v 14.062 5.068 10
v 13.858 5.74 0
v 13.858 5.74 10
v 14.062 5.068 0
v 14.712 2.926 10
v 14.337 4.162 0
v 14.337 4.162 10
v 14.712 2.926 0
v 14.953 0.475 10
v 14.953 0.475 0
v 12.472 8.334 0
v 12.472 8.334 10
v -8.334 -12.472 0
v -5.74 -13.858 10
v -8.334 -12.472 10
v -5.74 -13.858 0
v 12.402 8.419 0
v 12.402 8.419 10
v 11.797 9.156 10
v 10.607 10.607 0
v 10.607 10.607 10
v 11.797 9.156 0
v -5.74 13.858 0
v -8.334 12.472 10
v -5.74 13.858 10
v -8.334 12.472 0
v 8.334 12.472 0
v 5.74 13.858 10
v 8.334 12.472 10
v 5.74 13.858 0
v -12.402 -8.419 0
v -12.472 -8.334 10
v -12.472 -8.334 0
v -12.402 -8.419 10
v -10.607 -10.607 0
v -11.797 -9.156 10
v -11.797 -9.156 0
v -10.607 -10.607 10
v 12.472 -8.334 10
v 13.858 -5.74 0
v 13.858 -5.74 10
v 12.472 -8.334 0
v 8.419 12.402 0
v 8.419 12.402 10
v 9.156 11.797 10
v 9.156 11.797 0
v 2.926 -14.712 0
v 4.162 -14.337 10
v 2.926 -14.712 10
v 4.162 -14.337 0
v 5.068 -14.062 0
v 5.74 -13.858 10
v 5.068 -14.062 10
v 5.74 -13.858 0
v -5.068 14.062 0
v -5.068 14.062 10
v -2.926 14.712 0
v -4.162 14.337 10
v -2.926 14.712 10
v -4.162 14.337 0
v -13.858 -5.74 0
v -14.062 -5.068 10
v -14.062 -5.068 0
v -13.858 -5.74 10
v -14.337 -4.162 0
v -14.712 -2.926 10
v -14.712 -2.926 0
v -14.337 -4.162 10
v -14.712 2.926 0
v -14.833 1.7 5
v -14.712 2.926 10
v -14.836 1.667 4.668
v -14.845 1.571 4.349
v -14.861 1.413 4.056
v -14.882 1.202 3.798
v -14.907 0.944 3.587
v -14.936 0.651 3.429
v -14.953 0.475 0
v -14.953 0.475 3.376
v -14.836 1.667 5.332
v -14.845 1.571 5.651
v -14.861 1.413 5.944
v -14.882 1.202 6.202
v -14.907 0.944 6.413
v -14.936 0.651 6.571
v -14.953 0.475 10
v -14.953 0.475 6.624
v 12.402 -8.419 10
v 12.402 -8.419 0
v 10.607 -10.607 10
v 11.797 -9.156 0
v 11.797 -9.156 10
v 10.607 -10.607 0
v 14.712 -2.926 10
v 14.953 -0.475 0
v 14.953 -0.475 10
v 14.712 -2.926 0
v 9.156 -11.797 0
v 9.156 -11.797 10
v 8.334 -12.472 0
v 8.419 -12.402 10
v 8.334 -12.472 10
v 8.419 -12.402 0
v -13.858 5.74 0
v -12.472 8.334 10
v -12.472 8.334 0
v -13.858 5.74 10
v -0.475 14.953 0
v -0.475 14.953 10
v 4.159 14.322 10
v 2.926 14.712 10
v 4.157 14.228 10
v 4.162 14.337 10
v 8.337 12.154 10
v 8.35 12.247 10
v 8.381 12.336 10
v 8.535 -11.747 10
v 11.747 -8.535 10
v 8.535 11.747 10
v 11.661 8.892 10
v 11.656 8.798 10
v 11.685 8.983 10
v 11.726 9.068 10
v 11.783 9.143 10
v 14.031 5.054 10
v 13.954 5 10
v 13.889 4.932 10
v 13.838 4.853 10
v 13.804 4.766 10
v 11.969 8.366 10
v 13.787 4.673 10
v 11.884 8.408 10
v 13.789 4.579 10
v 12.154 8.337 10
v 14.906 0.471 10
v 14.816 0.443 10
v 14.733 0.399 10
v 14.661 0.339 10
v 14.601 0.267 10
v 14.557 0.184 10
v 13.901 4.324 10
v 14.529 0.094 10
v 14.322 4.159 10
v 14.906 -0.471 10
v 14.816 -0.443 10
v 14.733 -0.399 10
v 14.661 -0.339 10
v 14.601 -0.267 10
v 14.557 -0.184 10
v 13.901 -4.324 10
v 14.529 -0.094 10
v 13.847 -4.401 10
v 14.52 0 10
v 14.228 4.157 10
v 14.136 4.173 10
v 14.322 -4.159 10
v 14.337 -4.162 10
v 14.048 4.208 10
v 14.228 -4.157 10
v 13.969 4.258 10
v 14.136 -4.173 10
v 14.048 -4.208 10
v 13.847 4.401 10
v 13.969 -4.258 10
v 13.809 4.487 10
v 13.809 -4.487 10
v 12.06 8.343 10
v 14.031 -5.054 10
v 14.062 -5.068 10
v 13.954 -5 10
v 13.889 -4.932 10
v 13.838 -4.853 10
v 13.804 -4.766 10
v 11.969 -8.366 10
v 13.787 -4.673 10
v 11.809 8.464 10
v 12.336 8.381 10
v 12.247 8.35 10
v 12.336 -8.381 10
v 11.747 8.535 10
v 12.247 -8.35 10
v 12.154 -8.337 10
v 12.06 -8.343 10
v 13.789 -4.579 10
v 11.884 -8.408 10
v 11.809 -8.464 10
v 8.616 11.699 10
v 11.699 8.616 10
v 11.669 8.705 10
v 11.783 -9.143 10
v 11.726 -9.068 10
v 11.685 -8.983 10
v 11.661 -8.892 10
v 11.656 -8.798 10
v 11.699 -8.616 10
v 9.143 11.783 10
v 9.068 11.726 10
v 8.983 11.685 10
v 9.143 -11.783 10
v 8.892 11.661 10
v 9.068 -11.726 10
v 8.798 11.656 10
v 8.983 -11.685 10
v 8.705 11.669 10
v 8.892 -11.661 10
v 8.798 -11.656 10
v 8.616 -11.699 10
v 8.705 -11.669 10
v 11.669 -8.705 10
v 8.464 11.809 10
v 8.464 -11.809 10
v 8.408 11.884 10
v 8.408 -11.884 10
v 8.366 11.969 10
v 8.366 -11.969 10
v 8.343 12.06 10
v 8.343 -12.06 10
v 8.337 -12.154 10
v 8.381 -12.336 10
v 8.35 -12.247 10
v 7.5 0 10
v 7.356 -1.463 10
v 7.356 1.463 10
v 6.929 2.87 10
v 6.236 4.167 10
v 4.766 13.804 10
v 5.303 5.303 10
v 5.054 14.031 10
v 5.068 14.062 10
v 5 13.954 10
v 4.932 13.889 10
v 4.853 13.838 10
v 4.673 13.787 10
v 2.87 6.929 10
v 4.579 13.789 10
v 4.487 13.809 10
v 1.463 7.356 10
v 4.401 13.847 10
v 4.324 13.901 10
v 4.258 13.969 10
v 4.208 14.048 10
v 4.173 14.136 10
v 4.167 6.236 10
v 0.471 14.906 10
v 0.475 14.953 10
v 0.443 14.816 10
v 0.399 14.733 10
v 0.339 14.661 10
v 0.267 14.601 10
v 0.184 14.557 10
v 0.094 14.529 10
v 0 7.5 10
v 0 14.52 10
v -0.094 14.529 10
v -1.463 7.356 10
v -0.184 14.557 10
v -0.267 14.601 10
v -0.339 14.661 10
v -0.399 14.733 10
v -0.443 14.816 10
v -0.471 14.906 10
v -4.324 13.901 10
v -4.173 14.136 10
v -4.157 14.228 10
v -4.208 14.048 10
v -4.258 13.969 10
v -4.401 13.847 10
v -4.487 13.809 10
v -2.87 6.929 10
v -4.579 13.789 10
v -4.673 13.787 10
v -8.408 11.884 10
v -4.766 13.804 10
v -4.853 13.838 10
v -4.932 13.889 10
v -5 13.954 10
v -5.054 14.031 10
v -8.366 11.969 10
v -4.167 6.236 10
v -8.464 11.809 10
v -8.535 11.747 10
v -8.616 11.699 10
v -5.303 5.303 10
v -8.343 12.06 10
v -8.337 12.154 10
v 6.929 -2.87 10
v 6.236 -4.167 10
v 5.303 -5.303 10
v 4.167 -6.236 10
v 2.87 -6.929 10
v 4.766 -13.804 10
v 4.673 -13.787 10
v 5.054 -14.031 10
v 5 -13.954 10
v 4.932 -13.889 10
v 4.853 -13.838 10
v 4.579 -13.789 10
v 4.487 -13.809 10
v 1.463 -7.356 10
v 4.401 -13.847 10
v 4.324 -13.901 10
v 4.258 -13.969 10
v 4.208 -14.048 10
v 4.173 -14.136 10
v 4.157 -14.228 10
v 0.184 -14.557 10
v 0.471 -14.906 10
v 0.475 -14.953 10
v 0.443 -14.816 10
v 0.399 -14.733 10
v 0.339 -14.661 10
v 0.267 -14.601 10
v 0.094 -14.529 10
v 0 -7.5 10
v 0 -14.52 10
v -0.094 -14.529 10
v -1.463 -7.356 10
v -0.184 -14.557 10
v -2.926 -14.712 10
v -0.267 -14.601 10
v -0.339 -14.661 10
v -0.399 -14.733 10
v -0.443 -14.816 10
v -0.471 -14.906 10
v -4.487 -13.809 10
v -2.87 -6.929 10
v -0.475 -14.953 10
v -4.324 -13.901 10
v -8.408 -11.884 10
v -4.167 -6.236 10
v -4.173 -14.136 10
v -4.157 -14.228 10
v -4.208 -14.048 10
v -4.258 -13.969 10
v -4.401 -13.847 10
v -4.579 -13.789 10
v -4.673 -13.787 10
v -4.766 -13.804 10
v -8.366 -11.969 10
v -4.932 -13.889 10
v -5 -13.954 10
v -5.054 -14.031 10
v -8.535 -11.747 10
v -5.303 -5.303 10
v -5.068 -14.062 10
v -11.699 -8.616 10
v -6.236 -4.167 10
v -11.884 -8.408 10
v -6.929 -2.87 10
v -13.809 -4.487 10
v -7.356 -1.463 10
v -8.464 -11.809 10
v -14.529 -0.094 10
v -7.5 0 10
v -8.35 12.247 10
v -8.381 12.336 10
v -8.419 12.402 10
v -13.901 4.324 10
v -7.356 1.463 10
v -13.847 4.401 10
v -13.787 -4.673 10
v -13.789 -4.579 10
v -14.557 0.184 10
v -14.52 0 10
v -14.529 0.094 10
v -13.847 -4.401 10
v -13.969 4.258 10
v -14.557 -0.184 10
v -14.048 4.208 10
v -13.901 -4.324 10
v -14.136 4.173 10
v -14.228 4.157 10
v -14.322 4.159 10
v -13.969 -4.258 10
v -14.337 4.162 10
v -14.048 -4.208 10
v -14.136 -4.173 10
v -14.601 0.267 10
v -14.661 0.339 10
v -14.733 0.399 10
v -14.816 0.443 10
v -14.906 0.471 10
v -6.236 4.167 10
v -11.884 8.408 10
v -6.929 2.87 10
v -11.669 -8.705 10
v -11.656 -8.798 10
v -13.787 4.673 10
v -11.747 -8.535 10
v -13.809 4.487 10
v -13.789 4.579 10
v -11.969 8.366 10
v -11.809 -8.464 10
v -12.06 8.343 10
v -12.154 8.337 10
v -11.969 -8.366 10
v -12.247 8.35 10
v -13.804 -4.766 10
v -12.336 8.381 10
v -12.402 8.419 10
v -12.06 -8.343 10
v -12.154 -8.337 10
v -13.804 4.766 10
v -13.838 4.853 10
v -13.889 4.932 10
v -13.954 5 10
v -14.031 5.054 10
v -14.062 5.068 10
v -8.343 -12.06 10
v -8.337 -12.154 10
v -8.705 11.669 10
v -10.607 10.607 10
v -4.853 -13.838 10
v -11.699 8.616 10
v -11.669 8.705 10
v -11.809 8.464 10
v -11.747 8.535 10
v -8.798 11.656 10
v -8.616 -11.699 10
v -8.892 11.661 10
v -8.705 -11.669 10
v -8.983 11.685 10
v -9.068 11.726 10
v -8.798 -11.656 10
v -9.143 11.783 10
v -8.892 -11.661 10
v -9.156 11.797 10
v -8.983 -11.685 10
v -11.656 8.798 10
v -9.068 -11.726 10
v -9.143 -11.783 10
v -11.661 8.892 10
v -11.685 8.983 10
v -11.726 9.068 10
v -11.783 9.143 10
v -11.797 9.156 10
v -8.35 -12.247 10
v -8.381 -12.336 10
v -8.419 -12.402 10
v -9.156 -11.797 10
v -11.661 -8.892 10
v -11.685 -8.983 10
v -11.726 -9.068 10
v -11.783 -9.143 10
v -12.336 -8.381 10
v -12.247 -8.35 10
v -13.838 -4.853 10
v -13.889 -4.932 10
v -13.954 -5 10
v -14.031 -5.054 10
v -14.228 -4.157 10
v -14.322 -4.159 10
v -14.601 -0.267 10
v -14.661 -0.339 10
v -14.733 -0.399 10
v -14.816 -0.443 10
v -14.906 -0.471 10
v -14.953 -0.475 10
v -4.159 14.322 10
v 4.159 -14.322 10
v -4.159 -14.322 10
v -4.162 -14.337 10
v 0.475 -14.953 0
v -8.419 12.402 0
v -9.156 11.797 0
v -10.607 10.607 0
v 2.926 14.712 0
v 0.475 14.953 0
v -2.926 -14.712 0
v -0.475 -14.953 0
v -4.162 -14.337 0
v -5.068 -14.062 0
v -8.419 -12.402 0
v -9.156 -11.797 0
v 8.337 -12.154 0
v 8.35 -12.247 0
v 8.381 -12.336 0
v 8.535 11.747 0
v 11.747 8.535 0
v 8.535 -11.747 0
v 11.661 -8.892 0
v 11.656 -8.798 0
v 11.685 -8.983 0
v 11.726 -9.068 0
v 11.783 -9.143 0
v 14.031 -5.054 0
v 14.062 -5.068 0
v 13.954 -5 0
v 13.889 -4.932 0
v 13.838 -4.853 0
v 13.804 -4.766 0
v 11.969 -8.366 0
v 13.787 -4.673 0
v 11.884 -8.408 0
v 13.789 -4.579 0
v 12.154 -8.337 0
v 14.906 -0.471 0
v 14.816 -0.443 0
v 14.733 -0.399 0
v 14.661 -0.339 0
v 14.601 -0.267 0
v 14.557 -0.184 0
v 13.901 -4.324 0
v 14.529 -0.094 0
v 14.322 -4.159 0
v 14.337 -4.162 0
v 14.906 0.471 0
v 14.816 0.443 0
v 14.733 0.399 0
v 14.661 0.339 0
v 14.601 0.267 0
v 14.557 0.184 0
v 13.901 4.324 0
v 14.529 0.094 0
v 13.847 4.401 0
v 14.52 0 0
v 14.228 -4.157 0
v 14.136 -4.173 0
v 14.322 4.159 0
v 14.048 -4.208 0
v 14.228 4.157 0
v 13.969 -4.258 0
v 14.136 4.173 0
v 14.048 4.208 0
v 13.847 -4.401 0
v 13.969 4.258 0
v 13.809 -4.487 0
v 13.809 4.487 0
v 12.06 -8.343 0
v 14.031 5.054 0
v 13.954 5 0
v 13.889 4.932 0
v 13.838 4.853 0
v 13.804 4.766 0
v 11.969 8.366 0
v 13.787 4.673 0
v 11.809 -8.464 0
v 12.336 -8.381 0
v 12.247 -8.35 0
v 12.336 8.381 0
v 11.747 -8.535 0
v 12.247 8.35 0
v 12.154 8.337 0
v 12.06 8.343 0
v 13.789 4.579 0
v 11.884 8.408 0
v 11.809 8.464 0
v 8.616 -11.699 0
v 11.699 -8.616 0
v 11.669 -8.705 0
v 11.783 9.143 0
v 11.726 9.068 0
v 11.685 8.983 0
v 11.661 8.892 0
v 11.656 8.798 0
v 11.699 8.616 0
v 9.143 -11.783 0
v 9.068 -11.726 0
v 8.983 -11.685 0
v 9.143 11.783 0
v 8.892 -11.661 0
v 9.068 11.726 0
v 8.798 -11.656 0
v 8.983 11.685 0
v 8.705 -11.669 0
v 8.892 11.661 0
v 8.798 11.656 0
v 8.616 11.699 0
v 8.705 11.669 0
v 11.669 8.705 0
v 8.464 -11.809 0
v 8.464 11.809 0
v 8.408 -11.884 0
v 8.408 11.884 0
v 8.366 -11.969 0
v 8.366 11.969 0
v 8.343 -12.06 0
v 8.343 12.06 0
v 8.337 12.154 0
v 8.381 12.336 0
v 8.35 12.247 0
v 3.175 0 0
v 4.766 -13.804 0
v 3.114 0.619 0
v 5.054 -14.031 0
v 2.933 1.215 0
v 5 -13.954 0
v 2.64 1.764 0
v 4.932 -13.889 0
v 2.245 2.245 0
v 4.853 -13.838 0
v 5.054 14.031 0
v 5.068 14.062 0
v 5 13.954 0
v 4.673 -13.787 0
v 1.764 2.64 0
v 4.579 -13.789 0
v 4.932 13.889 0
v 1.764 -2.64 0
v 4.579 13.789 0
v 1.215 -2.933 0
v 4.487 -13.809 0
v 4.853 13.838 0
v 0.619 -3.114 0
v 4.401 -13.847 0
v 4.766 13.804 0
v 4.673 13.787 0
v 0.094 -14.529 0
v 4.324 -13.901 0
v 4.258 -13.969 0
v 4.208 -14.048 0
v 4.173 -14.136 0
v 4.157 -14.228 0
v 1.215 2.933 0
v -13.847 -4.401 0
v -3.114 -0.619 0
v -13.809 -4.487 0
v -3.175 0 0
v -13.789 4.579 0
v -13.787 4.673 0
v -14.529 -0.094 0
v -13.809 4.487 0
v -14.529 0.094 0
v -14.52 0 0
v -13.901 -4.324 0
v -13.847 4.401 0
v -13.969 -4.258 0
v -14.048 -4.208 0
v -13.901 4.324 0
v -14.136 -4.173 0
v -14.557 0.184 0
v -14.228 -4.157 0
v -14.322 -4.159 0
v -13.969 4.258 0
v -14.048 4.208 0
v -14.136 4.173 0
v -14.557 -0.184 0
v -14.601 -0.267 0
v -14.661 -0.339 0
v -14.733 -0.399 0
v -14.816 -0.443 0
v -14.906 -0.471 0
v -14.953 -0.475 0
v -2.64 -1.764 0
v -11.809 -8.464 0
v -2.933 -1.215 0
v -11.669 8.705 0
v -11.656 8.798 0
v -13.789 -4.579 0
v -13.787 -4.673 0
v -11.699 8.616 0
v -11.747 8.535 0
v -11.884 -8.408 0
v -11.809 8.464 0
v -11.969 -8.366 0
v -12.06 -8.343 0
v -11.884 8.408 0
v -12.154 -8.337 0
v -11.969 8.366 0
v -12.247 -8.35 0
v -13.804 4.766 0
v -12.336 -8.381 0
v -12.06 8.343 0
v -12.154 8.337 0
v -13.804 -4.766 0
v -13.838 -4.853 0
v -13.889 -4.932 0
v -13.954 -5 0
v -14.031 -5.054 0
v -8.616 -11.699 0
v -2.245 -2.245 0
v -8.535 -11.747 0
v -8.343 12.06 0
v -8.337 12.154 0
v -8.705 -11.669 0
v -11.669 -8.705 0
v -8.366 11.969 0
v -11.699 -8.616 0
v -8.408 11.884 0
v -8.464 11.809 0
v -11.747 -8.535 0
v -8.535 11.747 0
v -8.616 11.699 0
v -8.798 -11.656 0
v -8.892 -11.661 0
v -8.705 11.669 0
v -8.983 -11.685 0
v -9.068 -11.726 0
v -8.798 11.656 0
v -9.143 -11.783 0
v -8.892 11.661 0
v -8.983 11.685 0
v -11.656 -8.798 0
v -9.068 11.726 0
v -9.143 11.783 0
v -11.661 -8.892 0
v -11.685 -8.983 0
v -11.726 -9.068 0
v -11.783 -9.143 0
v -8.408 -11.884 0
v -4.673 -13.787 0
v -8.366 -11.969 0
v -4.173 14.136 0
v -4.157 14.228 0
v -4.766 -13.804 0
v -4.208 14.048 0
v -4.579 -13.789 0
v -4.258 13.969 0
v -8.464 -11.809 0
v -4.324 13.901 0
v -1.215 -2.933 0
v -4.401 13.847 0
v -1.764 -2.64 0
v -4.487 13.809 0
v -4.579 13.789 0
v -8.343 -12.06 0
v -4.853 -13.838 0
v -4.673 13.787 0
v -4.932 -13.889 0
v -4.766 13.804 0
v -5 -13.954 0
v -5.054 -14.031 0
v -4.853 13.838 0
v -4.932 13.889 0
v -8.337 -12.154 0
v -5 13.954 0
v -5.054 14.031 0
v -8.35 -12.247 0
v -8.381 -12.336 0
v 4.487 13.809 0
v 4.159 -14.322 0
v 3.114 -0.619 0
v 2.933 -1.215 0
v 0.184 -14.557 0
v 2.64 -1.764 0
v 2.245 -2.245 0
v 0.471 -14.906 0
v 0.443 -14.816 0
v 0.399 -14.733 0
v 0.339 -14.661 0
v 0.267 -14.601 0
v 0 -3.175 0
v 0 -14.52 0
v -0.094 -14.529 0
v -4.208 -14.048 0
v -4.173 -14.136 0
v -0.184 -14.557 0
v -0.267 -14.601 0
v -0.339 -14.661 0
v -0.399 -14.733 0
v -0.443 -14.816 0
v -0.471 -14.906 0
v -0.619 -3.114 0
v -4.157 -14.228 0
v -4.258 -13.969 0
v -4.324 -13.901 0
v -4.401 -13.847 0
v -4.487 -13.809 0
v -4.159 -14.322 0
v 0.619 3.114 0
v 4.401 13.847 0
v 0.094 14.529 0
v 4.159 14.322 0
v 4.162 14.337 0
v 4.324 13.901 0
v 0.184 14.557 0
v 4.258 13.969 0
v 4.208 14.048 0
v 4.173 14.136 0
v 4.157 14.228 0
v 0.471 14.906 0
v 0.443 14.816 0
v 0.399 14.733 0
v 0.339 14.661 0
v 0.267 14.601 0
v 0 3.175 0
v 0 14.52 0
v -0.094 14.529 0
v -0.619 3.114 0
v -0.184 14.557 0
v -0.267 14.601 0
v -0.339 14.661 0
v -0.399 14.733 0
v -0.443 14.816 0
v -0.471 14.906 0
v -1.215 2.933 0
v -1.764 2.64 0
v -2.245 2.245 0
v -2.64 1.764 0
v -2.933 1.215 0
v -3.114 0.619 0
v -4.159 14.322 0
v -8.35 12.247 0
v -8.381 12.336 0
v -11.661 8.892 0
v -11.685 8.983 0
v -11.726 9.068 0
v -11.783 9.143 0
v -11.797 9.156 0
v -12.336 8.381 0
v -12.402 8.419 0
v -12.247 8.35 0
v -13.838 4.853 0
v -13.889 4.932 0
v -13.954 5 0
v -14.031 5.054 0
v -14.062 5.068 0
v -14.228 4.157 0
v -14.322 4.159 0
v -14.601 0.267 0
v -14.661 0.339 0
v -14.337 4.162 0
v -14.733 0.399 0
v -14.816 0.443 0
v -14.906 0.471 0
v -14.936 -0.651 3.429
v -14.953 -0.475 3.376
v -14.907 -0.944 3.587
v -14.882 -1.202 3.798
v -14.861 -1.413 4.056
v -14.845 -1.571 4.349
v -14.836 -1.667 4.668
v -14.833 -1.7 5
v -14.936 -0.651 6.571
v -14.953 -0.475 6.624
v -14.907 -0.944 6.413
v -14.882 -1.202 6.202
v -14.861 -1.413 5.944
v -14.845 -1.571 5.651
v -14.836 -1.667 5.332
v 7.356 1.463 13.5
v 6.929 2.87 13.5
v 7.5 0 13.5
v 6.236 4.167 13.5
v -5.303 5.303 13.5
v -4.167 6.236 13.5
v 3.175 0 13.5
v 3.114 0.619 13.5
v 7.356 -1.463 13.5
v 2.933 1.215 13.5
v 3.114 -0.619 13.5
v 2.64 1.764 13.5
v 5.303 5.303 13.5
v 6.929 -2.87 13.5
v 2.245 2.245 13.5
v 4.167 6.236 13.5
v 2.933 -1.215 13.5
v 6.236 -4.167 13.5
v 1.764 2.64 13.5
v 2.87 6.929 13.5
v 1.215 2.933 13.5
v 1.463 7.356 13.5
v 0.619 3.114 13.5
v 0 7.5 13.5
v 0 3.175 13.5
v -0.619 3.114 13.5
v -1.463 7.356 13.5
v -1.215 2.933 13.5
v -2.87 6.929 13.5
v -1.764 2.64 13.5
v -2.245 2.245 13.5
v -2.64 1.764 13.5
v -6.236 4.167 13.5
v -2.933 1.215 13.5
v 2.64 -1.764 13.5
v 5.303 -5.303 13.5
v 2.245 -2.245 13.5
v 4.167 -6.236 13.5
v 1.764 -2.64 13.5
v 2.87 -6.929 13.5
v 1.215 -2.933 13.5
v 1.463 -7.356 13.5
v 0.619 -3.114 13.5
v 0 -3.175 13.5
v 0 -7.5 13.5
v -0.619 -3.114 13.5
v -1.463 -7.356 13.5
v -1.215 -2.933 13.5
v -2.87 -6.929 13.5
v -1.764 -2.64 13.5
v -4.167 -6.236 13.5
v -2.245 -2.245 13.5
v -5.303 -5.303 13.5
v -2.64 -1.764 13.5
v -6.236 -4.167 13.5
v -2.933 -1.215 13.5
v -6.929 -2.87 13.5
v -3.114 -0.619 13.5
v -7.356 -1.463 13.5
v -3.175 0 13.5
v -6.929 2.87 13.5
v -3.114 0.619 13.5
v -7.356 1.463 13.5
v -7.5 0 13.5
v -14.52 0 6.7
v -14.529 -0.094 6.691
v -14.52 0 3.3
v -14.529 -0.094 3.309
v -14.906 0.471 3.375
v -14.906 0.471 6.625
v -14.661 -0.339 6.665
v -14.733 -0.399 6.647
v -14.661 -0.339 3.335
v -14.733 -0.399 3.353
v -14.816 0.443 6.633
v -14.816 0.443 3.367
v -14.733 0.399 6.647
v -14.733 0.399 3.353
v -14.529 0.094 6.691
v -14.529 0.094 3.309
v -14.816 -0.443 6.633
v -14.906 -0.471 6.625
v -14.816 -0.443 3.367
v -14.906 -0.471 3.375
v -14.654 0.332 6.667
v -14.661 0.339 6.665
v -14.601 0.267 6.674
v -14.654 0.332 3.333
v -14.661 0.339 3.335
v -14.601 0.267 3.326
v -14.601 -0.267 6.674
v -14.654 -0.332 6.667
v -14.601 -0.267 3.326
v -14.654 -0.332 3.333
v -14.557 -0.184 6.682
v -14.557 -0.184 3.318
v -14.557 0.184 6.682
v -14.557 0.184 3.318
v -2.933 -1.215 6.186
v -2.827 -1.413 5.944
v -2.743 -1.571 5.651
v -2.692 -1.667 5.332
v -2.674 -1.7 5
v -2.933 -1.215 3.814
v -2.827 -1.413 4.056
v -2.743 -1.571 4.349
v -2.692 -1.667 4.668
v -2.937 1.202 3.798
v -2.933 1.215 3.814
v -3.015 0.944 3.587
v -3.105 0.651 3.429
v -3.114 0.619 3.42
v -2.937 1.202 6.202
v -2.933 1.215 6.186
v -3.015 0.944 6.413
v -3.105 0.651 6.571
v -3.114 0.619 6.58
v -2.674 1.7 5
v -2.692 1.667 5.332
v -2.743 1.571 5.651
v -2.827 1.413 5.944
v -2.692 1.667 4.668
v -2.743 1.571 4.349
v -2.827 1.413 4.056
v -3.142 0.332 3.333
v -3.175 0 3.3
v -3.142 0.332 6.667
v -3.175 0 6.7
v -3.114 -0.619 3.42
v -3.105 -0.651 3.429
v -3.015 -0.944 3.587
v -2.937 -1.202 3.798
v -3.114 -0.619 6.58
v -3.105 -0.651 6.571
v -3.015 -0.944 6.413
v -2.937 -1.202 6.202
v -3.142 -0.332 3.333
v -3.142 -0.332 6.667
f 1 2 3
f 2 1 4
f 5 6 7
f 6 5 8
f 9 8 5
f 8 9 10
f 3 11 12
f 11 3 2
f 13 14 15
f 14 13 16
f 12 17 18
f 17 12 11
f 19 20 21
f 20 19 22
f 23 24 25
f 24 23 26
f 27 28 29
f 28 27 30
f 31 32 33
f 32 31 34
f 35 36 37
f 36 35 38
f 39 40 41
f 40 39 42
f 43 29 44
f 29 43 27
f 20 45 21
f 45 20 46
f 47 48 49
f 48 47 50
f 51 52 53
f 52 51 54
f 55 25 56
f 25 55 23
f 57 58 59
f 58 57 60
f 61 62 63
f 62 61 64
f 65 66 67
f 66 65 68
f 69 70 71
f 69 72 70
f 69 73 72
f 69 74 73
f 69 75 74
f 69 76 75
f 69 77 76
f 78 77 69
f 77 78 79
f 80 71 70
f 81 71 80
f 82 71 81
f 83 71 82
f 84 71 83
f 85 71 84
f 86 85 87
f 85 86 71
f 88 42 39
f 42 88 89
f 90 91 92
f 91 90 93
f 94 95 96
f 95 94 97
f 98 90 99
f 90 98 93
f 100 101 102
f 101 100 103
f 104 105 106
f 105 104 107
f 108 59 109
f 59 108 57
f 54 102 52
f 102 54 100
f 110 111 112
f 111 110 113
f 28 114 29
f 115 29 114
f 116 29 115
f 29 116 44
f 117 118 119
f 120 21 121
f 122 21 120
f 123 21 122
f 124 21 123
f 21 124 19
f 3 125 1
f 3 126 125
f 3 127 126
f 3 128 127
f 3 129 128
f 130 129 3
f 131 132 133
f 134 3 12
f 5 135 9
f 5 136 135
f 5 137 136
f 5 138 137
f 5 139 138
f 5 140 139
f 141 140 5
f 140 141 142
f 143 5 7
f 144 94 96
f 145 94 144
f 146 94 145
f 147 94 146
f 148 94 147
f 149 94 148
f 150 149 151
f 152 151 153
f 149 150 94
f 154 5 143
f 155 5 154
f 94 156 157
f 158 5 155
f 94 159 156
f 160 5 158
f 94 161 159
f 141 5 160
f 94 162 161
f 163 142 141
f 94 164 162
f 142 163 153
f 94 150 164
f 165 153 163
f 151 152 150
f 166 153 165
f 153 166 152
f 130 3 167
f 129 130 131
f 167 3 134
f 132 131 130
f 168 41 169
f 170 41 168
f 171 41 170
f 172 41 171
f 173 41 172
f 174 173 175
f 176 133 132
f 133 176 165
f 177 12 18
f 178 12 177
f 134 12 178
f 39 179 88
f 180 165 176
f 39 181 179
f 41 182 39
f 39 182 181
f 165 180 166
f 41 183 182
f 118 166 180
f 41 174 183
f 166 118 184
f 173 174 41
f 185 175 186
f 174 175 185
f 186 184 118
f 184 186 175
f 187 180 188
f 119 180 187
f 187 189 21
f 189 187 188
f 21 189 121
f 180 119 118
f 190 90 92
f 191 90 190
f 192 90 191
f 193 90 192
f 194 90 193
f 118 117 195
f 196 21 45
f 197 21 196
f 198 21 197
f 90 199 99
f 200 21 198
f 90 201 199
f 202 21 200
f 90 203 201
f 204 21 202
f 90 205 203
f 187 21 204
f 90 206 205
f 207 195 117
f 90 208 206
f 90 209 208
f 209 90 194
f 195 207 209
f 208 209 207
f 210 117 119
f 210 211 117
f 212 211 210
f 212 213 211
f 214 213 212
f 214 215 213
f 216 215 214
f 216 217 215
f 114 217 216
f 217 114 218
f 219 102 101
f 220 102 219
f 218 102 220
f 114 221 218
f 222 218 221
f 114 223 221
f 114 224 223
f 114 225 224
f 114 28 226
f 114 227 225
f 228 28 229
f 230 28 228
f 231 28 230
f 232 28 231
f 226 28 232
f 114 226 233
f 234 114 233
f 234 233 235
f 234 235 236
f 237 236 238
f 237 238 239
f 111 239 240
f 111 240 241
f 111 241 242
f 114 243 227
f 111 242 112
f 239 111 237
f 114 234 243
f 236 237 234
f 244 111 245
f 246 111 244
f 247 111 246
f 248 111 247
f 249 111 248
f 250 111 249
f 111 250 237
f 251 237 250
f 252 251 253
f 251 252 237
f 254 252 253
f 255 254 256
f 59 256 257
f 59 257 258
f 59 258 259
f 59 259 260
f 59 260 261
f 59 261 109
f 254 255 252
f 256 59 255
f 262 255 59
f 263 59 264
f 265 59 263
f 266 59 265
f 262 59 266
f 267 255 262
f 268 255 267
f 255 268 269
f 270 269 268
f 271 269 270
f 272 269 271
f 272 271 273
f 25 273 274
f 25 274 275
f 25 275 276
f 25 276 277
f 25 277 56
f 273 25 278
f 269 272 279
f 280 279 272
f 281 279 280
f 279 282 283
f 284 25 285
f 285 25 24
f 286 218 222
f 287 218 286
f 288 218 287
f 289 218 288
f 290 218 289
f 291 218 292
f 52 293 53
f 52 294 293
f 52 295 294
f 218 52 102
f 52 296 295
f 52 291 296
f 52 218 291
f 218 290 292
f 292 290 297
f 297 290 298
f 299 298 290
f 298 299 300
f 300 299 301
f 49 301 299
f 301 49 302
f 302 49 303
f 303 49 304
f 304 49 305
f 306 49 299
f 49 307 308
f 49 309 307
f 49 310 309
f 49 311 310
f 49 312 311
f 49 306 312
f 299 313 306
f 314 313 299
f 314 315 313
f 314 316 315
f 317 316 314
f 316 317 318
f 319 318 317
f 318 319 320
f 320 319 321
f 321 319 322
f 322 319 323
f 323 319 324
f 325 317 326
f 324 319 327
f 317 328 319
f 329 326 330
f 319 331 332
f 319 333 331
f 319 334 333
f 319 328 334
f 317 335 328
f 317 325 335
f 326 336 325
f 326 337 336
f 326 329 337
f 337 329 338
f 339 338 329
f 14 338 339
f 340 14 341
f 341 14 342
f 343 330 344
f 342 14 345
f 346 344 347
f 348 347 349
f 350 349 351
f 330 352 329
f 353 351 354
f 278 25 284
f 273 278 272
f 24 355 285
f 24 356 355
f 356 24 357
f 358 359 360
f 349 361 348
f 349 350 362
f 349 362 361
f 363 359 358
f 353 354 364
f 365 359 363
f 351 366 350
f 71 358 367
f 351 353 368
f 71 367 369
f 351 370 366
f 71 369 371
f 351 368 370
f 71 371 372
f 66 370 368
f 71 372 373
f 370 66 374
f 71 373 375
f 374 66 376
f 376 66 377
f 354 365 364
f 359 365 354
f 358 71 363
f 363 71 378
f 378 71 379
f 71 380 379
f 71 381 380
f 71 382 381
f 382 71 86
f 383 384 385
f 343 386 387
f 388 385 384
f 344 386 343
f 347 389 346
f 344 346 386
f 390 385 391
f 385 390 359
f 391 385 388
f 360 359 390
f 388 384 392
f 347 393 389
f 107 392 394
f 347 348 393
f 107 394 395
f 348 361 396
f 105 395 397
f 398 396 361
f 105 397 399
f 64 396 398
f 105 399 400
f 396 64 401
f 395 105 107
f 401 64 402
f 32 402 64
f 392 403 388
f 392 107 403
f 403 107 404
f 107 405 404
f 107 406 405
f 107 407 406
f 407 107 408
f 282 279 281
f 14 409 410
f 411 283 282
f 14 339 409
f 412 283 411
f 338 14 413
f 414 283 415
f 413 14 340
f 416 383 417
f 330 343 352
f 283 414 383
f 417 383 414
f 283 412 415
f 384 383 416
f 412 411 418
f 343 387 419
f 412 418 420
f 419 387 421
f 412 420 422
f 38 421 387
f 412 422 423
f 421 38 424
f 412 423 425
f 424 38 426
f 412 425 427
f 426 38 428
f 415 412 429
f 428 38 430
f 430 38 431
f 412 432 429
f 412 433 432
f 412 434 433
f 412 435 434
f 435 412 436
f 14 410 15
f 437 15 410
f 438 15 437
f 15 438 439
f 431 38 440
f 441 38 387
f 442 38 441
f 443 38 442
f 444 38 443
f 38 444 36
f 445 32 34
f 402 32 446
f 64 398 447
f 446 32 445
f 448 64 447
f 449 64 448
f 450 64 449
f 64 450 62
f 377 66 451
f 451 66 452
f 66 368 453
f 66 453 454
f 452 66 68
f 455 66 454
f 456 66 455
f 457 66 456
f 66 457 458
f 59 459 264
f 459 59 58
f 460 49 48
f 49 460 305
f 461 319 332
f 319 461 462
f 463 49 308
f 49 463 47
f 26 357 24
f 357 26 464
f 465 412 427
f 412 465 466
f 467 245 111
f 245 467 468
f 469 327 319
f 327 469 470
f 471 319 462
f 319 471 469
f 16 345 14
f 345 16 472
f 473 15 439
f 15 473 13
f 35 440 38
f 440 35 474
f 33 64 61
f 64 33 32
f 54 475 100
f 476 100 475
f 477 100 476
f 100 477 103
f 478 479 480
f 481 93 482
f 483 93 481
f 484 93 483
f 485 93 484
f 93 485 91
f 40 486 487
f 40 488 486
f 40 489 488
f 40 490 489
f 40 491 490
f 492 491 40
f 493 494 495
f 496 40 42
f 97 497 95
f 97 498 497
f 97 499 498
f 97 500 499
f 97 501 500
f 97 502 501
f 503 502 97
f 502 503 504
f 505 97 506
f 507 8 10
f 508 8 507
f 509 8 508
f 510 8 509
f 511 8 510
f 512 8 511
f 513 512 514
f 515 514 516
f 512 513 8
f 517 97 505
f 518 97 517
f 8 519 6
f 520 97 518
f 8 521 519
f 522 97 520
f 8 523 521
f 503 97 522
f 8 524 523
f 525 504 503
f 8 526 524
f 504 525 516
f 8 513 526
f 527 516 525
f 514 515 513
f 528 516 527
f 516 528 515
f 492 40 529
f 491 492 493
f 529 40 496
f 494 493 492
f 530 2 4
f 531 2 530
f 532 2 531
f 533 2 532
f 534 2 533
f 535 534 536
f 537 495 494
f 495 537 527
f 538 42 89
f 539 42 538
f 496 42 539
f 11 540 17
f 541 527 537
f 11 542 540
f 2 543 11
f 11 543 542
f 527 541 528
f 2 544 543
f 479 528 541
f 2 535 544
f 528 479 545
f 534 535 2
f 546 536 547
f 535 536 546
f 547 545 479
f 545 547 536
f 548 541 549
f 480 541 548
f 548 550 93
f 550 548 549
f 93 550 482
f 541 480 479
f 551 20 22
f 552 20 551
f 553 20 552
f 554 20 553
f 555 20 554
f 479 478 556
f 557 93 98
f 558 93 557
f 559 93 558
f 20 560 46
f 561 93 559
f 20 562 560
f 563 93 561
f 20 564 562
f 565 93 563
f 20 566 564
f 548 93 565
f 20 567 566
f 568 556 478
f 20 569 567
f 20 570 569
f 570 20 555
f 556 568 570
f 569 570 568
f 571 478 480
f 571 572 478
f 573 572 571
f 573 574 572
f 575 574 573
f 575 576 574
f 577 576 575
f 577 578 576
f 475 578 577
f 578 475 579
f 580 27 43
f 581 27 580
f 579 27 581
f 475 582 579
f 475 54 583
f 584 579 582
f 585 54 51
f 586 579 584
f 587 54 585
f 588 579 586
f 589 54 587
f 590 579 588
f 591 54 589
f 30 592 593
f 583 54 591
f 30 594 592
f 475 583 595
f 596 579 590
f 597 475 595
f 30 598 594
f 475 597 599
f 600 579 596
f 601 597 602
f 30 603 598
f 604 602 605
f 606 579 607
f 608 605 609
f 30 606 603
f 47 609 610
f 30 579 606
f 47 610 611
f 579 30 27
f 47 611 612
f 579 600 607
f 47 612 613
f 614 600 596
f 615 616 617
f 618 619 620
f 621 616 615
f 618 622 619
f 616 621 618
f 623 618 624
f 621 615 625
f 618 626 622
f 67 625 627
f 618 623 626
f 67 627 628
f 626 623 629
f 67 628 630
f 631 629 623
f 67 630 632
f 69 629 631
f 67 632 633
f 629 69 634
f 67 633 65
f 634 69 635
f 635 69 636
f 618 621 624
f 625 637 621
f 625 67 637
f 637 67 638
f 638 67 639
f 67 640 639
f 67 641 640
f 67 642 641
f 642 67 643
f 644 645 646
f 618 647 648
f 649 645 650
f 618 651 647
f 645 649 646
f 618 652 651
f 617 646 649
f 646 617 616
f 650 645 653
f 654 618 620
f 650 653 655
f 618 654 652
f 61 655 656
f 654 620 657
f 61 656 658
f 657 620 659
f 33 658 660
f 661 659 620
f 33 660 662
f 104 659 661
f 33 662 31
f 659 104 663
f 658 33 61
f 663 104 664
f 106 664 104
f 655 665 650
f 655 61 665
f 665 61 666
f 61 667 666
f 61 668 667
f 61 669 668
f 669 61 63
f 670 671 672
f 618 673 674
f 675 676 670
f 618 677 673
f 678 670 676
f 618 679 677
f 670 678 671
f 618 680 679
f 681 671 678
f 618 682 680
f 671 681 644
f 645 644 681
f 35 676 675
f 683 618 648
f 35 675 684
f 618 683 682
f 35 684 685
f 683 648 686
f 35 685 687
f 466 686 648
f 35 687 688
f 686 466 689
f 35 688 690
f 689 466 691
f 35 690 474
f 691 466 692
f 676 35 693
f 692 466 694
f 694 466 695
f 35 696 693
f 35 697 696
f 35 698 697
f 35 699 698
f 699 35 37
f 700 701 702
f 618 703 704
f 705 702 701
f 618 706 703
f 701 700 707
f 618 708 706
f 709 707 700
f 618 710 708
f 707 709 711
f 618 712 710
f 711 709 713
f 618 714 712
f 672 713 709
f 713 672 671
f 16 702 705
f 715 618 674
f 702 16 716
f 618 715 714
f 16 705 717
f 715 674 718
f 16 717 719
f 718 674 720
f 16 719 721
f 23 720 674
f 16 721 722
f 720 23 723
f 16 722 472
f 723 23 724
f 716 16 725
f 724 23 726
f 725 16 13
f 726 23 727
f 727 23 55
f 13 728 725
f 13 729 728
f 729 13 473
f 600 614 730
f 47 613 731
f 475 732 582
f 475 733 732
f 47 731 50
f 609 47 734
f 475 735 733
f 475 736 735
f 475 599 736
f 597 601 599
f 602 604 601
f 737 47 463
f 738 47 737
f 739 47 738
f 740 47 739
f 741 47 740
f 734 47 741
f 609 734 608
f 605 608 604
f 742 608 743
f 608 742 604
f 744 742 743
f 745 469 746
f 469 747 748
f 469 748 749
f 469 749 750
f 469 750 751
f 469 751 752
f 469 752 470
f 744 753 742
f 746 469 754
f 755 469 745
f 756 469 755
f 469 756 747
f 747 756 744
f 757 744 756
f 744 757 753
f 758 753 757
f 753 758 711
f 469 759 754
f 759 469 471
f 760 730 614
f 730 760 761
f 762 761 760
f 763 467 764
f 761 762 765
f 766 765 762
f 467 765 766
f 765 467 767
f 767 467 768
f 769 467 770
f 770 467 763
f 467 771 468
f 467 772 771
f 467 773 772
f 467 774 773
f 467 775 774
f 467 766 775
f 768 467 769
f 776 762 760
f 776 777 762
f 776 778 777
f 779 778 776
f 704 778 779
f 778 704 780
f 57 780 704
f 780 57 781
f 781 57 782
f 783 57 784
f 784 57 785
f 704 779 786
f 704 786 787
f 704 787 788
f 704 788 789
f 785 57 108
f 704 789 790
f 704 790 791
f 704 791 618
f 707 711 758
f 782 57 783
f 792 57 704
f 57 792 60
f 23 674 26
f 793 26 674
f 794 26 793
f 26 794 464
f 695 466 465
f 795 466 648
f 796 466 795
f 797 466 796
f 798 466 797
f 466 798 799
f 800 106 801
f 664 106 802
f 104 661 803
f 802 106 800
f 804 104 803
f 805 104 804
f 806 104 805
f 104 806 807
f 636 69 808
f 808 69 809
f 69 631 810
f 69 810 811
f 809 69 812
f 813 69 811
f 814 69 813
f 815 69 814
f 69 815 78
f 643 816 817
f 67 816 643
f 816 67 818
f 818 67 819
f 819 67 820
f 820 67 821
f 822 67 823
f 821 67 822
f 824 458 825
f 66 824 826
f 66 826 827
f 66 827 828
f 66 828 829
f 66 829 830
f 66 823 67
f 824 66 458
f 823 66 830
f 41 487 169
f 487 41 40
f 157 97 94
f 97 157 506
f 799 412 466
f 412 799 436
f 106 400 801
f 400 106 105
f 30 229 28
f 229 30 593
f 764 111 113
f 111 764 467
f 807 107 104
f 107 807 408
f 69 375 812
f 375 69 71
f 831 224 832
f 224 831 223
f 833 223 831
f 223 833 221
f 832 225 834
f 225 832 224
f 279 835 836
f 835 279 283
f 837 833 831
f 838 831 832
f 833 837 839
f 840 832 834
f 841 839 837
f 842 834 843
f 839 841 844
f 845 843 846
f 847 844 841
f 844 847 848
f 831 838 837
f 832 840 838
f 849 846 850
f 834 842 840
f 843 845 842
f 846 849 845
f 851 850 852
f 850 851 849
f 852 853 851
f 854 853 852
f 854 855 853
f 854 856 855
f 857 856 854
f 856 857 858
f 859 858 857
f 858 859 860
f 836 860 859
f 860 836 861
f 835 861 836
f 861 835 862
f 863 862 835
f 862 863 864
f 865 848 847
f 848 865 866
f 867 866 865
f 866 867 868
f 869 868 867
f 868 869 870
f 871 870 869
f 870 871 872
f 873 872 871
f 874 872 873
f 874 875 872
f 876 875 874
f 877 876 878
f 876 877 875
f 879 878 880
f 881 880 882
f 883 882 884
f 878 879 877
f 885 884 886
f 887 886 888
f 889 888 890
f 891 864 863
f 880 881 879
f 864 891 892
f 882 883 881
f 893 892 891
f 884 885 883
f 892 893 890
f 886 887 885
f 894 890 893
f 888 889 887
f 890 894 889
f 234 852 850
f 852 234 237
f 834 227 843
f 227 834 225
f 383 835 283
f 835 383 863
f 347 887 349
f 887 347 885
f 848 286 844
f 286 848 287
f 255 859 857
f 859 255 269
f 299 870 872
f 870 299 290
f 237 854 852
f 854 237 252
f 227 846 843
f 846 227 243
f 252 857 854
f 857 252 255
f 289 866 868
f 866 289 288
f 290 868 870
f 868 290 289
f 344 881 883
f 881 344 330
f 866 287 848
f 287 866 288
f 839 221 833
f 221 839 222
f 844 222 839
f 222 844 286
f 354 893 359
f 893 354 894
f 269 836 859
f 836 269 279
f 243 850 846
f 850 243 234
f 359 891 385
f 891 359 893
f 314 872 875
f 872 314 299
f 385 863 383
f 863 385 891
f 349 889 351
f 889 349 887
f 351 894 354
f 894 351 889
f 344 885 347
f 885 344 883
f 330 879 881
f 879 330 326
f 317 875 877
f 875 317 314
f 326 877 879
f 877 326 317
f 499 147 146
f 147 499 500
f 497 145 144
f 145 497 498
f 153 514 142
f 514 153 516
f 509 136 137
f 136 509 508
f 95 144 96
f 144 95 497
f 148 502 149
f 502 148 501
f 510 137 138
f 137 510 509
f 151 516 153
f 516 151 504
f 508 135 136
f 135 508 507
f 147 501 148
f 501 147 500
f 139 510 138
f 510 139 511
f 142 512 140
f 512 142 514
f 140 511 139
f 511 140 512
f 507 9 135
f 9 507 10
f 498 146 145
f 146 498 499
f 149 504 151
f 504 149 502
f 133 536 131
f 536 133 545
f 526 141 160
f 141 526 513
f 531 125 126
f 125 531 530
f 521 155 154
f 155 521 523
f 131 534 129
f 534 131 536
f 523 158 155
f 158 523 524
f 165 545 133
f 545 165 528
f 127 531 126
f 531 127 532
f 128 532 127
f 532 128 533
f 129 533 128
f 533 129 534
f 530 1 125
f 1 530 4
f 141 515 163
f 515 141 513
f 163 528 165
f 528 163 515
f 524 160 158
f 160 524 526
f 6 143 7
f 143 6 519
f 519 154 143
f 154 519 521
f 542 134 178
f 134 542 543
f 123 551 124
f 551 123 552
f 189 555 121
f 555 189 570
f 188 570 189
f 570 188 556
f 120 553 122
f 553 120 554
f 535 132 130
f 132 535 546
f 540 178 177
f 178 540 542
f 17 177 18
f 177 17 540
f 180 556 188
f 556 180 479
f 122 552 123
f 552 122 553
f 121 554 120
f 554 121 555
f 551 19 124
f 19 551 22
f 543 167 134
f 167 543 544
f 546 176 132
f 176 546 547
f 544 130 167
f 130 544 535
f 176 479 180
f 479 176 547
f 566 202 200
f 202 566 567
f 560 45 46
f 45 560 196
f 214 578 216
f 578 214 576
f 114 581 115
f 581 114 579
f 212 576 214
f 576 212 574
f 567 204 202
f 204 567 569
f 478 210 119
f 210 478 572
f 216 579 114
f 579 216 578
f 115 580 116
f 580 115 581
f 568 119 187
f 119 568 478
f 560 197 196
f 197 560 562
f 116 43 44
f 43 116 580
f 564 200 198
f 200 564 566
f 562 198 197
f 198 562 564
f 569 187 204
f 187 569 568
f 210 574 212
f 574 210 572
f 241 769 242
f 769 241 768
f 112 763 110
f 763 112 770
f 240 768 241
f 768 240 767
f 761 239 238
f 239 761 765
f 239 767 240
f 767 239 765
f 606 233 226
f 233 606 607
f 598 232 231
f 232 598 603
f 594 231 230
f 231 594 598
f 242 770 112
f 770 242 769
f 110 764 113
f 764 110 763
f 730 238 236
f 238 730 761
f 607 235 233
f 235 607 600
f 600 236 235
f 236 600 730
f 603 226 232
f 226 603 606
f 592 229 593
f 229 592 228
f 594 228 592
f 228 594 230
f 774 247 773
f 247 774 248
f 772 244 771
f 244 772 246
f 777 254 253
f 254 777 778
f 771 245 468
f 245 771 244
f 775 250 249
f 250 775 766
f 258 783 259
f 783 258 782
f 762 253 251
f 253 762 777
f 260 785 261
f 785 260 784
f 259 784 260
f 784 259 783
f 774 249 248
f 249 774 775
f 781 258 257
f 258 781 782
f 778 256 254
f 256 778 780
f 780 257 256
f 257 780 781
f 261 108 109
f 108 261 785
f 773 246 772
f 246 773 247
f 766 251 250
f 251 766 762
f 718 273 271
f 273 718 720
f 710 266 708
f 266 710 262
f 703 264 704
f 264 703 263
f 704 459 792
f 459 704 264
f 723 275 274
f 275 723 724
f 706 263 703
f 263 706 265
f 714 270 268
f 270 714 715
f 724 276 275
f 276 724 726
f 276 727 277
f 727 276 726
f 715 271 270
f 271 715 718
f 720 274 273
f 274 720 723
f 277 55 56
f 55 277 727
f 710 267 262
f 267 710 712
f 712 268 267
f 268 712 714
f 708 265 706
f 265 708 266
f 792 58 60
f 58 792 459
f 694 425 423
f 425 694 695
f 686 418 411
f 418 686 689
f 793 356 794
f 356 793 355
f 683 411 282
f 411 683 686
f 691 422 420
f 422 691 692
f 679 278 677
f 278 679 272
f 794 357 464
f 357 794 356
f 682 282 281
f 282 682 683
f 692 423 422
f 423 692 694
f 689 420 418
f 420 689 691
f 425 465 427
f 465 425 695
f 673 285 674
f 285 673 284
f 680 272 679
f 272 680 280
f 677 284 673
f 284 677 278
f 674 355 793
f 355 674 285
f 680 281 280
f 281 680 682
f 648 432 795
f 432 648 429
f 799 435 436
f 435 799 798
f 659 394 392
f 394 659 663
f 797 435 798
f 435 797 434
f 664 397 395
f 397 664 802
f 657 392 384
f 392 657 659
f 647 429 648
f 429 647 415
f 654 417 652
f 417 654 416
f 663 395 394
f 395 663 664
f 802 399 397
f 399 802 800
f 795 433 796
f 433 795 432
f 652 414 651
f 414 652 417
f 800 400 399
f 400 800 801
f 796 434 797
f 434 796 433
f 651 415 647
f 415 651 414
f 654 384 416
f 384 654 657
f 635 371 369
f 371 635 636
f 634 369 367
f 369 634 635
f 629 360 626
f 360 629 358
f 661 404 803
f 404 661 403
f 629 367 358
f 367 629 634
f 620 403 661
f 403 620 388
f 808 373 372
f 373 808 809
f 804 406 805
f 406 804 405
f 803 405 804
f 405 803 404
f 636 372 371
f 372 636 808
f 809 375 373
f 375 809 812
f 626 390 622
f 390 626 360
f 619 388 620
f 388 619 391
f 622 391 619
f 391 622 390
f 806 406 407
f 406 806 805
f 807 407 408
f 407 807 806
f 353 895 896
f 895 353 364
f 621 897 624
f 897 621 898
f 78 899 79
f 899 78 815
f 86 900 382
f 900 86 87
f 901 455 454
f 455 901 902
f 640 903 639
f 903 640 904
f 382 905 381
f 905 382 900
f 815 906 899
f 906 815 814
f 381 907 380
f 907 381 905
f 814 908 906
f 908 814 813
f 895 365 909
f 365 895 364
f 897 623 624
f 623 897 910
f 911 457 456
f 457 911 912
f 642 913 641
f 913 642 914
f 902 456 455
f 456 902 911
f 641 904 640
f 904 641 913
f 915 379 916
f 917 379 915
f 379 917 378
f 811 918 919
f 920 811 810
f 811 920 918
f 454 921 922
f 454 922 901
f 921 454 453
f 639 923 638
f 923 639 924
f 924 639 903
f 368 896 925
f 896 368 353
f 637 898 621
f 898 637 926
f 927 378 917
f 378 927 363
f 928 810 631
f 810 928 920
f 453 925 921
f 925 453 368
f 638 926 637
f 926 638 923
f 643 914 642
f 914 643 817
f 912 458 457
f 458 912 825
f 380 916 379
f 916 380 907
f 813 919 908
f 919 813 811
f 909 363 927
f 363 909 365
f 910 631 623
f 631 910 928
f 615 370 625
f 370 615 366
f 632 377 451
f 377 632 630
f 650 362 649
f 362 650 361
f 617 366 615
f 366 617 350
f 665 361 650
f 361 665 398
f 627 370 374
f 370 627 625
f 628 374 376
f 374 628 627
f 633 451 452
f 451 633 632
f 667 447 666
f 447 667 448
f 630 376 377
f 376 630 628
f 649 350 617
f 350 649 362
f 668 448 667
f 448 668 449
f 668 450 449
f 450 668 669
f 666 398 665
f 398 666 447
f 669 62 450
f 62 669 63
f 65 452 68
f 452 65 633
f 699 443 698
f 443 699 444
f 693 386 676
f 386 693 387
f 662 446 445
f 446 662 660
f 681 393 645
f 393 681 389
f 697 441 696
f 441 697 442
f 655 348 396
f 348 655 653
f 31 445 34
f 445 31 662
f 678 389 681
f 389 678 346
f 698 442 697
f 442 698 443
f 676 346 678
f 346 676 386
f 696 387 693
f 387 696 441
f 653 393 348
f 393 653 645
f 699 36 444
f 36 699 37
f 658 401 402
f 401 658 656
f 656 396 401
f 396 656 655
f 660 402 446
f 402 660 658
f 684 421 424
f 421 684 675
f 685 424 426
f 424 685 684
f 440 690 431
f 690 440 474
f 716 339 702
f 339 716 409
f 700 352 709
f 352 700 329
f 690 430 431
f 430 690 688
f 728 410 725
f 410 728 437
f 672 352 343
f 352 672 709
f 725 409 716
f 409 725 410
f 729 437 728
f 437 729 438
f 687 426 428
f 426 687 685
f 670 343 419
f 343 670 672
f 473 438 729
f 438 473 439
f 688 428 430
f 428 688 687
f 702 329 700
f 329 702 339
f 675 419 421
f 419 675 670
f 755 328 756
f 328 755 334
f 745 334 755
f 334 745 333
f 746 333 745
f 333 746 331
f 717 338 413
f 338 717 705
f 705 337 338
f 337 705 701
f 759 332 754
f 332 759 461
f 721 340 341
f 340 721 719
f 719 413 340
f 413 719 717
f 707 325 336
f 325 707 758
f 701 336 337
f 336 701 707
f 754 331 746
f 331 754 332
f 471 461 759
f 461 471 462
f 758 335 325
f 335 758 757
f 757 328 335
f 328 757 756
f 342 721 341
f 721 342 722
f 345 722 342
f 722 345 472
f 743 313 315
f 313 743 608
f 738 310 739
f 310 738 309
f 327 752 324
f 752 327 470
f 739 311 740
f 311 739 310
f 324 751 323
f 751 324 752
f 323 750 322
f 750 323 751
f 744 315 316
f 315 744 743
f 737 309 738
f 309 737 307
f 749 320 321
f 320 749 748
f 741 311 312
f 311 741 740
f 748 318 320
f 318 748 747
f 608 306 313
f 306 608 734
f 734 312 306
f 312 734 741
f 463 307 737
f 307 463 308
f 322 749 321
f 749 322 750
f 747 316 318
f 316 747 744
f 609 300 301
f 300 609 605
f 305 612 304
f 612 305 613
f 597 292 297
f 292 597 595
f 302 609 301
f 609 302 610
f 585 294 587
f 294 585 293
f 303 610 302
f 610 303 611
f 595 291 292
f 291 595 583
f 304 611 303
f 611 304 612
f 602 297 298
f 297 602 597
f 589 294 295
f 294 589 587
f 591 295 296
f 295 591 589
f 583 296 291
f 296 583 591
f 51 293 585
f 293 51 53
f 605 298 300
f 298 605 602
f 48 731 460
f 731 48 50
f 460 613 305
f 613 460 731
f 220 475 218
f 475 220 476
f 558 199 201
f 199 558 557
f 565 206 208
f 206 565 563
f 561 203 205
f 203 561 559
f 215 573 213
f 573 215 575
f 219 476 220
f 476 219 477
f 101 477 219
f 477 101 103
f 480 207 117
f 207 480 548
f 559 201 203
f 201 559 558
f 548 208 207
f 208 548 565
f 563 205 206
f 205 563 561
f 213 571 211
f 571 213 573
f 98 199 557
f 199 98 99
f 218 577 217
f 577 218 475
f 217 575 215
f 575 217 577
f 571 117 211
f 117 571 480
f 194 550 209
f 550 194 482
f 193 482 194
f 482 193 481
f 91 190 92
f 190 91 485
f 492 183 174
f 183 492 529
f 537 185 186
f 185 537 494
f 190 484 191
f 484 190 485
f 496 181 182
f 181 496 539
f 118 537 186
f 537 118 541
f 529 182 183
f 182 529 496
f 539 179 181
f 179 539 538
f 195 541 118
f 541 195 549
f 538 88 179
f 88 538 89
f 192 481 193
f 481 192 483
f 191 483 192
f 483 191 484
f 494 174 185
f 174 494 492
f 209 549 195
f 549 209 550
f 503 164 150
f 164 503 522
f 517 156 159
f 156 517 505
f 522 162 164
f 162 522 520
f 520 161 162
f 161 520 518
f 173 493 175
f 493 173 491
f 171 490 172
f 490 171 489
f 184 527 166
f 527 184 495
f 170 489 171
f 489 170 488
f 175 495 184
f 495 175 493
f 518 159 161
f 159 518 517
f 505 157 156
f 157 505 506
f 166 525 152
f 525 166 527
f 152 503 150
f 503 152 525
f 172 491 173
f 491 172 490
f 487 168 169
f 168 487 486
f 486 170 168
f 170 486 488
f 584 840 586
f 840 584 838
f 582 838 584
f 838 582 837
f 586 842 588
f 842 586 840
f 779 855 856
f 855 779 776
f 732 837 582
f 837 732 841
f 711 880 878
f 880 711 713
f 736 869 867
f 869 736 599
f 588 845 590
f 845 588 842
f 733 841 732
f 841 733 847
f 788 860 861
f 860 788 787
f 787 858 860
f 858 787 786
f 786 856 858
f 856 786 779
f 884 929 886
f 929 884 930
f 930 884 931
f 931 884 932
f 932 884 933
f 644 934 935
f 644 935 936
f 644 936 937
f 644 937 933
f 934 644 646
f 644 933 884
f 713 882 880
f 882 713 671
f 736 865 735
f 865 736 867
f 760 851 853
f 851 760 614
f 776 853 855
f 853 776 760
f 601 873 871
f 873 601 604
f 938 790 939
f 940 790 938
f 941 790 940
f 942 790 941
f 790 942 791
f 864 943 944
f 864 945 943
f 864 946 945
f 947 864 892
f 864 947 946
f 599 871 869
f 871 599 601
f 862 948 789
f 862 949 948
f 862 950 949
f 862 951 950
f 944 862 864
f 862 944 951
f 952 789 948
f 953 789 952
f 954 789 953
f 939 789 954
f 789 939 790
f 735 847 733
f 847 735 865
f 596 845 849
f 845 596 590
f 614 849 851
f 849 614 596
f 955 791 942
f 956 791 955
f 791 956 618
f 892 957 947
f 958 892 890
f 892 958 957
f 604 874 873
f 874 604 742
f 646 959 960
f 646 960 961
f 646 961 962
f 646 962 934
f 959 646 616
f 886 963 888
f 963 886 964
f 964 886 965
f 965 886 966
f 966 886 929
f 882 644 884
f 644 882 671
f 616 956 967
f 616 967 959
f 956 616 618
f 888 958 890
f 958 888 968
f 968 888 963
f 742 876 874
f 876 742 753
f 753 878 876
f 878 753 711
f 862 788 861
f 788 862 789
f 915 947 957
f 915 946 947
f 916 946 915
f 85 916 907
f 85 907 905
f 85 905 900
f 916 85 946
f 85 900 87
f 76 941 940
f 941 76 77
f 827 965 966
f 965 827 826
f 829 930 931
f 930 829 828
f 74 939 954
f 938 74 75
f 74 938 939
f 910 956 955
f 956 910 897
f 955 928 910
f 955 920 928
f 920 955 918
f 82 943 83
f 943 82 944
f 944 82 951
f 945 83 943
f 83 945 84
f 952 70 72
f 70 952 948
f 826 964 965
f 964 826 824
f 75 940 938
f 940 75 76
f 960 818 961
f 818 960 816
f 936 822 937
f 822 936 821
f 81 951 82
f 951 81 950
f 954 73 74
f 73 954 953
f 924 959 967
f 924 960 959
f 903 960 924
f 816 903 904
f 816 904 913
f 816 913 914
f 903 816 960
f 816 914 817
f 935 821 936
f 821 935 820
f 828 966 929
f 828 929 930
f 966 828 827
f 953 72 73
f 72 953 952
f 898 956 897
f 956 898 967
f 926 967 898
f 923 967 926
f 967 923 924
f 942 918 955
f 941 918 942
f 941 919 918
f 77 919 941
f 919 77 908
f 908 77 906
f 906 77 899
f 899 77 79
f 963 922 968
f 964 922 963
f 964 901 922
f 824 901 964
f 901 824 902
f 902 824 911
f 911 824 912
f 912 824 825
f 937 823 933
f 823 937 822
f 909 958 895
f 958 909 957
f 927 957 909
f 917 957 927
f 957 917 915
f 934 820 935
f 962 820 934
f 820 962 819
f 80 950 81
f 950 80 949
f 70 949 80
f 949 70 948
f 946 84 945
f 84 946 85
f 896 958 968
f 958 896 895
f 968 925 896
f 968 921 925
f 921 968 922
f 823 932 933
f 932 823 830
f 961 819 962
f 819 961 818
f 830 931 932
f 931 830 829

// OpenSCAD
$fn = 32;

// ----------------------------------------------------------------------
// Hand knob: 30 x 30 x 13.5 mm
// ----------------------------------------------------------------------

// --- parameters (mm) ---
head_d = 30;              // knob diameter
head_h = 10;              // knob height
hole_d = 6.35;            // shaft bore
set_d = 3.4;              // set screw tap hole
notch_d = 0.96;           // knurl groove diameter
knurl_n = 20;             // number of knurl grooves
cap_h = 3.5;              // raised centre cap
cap_d = 15;               // centre cap diameter

module body() {
  cylinder(h = head_h, d = head_d);
}

module cap() {
  translate([0, 0, head_h - 1]) cylinder(h = cap_h + 1, d = cap_d);
}

difference() {
  union() {
    body();
    cap();
  }
  translate([0, 0, -1]) cylinder(h = head_h + cap_h + 2, d = hole_d);
  /* knurl grooves */
  for (i = [0 : knurl_n - 1])
    rotate([0, 0, i * 360 / knurl_n])
      translate([head_d / 2, 0, -0.5])
        cylinder(h = head_h + 1, d = notch_d);
  translate([-head_d / 2 - 1, 0, head_h * 0.5]) rotate([0, 90, 0]) cylinder(h = head_d / 2 + 2, d = set_d);
}
